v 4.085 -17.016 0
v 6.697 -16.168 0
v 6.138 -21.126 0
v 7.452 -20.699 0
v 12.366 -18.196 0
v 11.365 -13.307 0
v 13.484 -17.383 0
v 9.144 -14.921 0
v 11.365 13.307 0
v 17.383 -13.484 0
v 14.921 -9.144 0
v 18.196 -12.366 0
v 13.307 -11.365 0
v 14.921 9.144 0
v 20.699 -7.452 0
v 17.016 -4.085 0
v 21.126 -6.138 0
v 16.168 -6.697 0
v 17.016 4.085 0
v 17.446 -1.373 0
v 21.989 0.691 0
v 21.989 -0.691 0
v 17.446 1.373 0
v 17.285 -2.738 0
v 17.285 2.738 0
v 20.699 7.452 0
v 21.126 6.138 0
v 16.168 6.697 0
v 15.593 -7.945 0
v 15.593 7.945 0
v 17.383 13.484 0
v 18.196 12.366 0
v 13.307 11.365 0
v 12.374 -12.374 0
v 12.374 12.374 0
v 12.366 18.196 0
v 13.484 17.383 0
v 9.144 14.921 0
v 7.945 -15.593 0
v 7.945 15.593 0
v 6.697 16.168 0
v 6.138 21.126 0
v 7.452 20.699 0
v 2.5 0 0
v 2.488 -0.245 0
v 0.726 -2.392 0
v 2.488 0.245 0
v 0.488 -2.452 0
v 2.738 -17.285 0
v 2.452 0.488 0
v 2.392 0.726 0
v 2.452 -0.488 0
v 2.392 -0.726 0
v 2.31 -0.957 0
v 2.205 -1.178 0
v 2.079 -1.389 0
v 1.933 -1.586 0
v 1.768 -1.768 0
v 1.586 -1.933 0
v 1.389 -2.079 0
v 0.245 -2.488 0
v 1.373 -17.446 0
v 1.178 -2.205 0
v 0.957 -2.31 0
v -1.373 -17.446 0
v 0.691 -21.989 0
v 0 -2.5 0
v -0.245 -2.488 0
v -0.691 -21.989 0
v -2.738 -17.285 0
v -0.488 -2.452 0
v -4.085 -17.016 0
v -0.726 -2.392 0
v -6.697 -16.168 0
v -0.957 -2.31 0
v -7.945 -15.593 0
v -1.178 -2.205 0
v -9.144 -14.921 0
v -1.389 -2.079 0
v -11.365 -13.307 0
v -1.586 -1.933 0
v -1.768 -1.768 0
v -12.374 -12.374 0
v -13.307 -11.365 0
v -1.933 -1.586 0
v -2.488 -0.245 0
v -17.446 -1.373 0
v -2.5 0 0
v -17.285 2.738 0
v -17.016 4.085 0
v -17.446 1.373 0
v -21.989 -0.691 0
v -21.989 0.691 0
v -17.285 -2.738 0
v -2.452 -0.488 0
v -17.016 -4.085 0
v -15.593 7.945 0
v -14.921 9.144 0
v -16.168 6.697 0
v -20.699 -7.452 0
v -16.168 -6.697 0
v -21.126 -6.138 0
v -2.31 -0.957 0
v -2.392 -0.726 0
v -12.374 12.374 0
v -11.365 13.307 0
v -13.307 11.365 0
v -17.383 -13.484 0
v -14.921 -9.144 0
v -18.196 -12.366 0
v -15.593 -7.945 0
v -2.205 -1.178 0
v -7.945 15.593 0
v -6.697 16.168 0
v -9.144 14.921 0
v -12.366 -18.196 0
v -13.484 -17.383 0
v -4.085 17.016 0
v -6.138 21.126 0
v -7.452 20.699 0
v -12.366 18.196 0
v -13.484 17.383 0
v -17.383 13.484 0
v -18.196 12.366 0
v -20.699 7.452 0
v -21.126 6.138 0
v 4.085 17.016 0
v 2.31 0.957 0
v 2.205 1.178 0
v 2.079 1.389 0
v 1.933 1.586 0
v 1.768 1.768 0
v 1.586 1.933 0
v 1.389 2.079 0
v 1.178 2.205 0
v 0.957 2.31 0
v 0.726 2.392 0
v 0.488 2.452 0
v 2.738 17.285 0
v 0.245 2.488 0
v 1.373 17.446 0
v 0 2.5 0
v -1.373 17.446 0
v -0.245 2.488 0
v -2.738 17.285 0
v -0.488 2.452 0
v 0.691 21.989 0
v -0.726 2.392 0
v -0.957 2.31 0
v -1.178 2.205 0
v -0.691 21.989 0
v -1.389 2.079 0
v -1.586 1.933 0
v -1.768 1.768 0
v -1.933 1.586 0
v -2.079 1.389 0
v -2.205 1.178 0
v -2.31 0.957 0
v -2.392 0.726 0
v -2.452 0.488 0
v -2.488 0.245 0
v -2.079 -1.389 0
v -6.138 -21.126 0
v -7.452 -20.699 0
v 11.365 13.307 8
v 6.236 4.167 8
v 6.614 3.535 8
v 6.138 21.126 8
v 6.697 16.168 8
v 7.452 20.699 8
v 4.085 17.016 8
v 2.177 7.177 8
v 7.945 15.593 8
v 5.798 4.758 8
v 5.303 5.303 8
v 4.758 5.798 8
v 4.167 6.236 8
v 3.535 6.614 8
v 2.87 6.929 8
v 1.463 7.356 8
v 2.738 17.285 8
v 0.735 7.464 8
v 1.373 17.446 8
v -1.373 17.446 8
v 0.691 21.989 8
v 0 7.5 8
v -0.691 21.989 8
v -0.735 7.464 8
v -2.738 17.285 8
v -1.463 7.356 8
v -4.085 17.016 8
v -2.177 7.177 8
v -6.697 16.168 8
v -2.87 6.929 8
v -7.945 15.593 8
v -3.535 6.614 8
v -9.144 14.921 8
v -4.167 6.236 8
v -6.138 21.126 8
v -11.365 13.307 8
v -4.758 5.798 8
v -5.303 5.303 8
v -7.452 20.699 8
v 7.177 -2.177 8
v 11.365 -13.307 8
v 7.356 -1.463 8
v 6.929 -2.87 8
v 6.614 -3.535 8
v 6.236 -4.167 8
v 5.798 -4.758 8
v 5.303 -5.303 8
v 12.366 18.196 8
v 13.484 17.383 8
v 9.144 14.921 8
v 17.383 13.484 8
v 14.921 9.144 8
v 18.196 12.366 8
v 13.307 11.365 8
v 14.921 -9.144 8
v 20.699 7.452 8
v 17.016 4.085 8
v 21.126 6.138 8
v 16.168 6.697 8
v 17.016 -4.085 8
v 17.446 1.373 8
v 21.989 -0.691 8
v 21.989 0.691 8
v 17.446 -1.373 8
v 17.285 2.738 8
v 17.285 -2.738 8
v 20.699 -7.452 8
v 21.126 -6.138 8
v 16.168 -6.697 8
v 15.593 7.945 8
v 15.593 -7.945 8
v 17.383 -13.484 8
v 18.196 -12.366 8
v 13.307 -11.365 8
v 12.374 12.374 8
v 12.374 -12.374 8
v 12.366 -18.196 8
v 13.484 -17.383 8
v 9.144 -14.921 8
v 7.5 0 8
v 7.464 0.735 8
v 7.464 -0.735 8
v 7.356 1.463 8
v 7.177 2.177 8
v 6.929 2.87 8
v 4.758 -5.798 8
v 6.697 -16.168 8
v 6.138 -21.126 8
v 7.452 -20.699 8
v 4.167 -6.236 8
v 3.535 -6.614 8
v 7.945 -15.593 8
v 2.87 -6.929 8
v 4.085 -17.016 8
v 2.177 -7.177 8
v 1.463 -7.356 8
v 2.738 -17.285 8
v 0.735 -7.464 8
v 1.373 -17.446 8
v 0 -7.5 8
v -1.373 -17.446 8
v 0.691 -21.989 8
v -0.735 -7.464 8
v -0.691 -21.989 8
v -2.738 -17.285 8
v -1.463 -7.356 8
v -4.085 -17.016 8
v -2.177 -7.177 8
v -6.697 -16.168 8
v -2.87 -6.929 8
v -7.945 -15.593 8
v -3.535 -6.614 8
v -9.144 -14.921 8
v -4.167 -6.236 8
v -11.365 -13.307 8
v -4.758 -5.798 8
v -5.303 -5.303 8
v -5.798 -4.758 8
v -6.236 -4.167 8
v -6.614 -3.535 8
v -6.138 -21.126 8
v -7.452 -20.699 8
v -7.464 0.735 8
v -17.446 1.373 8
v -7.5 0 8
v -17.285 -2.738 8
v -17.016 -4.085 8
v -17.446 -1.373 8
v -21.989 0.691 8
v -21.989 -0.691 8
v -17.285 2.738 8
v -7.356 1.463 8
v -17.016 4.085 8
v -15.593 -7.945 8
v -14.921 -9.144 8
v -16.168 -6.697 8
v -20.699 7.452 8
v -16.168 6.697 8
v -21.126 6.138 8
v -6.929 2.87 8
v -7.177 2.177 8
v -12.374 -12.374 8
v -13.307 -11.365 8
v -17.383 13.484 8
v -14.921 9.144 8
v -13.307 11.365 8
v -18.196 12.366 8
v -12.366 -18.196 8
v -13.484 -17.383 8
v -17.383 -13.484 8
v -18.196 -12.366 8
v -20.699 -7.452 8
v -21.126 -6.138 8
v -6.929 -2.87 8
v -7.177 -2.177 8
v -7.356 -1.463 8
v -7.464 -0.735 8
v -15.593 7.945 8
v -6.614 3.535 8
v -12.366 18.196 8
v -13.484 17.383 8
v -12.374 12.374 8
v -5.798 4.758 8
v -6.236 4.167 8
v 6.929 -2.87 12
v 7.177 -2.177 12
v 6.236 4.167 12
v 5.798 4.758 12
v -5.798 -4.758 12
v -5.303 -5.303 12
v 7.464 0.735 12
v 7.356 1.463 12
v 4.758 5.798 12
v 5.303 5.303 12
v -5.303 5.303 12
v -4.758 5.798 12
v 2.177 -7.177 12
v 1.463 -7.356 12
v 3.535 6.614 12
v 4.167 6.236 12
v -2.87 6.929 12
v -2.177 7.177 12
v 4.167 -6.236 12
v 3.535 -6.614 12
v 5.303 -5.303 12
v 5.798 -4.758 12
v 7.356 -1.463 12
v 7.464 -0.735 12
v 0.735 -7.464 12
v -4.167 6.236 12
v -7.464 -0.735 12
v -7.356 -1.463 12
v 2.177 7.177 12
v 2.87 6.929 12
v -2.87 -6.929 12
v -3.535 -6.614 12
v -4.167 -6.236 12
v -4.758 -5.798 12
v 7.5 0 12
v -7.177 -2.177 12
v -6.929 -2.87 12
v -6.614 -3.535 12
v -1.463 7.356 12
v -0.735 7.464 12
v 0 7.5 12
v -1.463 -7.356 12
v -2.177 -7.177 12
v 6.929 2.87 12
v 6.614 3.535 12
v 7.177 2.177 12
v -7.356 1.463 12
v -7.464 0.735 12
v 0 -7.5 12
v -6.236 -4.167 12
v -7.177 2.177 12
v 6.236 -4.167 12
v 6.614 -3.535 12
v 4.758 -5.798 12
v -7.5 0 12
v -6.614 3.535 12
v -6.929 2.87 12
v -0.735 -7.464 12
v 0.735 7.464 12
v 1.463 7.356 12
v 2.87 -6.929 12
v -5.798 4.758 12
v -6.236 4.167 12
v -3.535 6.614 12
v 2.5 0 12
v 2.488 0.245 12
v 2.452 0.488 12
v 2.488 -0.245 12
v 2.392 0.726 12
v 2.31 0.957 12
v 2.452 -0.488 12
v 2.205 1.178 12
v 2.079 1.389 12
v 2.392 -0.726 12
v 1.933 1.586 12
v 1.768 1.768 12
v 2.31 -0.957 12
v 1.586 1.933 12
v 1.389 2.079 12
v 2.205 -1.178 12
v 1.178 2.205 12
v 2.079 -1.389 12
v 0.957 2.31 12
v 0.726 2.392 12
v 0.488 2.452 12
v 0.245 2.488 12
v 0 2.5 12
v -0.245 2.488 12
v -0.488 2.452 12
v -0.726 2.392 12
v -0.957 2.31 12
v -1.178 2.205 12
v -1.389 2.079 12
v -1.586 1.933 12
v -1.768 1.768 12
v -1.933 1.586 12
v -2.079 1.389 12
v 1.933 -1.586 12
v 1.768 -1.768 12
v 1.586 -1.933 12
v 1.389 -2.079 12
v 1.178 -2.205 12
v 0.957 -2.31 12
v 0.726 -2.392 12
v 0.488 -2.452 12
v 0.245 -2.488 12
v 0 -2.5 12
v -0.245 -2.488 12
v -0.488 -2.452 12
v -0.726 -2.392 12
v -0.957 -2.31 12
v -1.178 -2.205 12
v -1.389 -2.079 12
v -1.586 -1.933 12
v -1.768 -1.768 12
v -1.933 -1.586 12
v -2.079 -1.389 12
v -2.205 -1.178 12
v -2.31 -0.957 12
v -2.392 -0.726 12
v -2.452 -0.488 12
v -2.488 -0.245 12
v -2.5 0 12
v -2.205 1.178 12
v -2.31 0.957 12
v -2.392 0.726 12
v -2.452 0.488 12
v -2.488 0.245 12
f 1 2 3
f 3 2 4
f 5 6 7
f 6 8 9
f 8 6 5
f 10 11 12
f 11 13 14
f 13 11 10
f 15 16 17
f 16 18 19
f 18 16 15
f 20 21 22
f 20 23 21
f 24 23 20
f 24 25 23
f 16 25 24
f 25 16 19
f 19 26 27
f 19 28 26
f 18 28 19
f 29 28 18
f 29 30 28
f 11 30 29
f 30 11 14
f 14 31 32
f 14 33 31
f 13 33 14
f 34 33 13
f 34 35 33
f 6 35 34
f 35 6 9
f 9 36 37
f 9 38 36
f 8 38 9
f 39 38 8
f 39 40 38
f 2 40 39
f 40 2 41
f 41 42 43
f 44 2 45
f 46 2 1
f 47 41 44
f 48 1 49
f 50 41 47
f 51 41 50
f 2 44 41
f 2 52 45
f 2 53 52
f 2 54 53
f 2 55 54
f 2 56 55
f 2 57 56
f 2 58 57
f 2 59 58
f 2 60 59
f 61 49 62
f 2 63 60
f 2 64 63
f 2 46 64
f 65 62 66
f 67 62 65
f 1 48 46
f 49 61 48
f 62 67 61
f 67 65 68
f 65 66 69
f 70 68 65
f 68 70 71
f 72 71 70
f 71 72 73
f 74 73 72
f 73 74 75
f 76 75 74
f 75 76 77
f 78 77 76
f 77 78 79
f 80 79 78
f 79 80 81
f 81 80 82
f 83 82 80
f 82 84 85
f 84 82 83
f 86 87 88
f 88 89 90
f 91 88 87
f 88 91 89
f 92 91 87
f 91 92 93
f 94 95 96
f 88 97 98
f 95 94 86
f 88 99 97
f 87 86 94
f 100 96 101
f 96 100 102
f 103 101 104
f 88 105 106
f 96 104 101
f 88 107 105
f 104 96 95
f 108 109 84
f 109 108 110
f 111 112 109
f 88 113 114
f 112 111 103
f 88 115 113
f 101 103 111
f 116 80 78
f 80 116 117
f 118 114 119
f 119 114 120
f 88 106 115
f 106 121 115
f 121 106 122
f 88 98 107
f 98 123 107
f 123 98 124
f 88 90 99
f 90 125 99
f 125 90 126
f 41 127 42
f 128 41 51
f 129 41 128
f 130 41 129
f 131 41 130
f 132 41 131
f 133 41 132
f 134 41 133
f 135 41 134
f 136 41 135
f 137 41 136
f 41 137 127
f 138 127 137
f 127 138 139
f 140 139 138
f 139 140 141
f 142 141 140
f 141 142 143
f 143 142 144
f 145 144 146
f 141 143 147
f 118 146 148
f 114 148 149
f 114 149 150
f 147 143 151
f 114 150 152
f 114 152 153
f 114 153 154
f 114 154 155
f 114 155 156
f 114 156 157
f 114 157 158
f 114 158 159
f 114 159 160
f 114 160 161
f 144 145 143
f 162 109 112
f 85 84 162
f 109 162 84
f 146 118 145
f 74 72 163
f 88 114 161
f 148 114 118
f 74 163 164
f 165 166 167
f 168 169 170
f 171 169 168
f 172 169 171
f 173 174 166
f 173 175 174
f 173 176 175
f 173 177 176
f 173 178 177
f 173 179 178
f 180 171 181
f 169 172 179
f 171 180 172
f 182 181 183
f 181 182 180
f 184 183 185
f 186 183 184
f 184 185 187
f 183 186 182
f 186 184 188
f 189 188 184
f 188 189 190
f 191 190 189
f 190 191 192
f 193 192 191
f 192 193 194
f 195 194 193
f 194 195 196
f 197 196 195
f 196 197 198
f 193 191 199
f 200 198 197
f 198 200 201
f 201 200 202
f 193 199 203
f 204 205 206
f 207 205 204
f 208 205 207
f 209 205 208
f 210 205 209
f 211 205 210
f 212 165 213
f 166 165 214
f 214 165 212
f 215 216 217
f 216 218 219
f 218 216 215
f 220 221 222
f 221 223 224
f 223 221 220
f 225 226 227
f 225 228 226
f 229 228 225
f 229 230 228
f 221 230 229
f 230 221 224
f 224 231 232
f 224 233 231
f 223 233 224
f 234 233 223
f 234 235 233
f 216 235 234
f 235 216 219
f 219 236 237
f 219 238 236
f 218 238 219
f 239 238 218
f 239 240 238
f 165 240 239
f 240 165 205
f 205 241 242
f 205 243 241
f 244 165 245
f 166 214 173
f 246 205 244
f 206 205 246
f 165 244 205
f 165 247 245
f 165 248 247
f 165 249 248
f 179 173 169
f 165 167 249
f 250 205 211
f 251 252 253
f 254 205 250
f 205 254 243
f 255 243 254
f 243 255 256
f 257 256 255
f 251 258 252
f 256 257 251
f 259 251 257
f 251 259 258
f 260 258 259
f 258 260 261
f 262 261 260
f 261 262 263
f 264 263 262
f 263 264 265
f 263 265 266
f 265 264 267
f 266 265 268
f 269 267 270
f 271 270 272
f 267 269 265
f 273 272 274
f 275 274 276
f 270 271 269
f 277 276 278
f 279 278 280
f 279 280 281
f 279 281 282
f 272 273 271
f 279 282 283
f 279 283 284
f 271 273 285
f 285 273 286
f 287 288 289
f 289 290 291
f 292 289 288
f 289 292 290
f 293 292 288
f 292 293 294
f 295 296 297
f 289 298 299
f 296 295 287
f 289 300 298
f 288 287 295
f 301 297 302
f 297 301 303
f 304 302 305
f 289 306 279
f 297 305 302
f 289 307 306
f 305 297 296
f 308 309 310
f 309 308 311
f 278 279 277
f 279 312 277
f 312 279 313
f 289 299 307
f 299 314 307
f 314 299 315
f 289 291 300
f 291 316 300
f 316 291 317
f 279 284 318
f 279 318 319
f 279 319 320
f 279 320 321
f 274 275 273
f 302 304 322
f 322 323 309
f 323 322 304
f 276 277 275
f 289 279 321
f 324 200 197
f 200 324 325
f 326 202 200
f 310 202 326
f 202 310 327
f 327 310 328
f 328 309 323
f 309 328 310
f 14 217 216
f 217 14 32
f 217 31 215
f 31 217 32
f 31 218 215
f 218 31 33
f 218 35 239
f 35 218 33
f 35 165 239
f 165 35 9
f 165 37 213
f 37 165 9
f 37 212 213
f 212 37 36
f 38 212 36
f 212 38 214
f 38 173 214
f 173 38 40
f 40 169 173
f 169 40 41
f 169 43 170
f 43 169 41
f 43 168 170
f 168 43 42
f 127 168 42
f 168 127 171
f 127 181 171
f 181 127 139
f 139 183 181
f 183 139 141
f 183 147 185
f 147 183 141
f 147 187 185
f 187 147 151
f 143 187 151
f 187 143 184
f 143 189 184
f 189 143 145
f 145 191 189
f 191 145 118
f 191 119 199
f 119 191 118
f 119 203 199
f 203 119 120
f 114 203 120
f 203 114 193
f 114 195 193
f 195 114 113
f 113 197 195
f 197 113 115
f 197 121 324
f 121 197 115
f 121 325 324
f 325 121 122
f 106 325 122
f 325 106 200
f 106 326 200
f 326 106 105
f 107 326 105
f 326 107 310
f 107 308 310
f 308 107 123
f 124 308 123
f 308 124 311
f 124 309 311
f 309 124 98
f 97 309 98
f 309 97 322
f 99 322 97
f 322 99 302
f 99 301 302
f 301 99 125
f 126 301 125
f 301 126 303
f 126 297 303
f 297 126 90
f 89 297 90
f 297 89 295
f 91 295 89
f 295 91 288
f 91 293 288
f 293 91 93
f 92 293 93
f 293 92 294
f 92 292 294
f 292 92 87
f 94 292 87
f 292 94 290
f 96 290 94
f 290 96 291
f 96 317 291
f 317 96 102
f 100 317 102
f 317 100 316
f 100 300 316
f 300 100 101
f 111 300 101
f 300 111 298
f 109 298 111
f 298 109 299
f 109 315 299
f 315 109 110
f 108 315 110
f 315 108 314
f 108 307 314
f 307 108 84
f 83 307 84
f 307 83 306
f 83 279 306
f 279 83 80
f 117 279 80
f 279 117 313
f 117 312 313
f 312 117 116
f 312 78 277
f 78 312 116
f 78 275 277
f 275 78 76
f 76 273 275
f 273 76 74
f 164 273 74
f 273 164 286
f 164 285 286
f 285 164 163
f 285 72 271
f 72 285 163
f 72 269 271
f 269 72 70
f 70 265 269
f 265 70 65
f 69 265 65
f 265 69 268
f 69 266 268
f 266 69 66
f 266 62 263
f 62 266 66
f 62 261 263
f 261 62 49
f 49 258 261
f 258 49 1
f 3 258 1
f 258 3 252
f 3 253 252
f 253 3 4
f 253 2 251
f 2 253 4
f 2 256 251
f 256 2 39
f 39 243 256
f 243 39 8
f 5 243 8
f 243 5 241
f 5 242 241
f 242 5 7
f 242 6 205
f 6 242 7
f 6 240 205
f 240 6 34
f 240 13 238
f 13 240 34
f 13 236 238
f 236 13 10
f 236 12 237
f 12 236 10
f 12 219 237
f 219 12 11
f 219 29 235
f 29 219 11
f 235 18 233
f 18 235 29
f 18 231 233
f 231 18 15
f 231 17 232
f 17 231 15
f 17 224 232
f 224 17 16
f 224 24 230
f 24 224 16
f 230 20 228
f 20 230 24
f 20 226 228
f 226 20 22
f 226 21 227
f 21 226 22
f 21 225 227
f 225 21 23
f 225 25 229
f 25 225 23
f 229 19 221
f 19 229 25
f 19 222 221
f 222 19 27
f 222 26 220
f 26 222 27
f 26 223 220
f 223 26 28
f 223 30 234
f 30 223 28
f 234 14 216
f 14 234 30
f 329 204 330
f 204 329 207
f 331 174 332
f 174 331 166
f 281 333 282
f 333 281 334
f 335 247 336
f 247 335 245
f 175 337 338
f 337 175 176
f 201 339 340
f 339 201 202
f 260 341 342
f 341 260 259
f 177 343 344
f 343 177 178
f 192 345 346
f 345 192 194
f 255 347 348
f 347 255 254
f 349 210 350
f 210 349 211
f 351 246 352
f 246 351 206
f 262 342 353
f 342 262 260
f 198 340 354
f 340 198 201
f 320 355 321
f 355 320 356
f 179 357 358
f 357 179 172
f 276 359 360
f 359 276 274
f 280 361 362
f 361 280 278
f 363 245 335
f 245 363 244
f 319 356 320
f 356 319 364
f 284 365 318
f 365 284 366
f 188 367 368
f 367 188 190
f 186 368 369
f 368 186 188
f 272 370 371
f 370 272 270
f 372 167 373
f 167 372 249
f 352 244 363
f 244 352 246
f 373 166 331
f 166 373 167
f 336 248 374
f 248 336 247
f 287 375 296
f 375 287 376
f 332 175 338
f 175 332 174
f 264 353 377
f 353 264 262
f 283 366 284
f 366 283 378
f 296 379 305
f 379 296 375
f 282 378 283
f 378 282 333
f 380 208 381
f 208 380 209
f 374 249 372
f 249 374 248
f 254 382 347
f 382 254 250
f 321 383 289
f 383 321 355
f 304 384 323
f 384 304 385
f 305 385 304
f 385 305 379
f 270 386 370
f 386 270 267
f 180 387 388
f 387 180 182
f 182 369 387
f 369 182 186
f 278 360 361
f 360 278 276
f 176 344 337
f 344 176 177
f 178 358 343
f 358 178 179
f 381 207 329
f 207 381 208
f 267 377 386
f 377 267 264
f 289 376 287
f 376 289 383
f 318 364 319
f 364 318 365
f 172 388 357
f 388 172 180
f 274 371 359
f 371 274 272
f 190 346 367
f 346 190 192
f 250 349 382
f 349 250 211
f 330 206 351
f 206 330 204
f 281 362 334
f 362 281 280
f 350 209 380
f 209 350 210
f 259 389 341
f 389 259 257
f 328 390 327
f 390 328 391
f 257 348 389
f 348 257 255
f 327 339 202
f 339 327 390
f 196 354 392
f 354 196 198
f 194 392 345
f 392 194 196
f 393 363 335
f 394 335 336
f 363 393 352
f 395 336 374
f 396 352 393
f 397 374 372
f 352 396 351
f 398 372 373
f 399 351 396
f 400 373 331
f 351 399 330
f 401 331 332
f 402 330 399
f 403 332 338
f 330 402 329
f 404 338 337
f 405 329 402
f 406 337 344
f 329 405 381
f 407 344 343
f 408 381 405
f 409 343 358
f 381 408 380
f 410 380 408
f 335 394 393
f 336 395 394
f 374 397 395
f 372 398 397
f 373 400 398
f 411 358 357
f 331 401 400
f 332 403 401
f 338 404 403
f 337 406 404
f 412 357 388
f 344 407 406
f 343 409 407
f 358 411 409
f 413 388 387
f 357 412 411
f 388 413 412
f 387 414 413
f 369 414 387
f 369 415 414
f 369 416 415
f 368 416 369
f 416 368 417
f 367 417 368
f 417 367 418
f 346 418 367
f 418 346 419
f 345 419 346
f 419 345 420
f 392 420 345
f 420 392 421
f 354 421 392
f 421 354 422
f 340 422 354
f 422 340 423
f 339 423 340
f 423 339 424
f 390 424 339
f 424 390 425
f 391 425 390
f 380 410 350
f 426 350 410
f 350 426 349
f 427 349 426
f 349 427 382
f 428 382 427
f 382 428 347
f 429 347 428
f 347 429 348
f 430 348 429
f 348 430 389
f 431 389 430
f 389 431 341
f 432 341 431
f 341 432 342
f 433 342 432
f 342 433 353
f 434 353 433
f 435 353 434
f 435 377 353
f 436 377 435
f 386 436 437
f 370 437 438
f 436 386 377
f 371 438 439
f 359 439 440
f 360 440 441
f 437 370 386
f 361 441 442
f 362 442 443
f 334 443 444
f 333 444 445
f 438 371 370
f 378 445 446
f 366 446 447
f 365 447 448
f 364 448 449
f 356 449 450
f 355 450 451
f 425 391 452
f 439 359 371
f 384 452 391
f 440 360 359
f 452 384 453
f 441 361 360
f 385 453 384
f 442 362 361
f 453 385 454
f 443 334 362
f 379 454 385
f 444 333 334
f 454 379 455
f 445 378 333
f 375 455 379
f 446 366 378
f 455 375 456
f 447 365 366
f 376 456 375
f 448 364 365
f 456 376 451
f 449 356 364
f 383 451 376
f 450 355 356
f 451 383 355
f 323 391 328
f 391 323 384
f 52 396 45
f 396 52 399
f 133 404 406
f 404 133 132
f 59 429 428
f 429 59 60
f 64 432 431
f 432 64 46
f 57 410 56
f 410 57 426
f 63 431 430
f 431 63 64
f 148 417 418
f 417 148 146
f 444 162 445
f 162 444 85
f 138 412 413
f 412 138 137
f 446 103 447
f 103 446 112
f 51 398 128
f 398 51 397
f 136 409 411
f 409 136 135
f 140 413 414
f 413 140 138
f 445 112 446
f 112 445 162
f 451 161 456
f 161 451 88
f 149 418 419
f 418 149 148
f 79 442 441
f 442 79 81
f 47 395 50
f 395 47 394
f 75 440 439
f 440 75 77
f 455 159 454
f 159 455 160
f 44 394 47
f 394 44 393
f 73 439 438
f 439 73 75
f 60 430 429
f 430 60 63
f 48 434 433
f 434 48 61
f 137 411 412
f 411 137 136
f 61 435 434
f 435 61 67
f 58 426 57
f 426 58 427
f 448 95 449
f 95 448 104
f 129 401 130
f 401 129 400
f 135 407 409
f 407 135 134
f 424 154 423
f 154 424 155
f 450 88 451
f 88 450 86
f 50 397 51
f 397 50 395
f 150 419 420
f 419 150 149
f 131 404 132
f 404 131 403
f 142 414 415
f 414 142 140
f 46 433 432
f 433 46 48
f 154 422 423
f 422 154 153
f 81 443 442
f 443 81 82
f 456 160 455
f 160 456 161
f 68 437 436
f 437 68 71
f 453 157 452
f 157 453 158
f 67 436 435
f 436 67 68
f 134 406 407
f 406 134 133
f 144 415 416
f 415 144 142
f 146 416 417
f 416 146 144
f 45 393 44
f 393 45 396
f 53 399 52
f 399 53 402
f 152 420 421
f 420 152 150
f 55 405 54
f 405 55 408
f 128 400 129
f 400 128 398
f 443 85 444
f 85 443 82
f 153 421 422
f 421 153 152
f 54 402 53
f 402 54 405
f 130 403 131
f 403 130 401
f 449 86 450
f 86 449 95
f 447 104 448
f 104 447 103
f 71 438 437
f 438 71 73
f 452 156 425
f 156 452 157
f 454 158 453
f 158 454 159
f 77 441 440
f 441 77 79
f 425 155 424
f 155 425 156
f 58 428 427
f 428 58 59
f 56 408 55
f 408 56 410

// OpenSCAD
// file: ../lib/validate-project.scad
// validate-project.scad — Project-specific validators (project-owned, never overwritten by harness)
// Base validators live in validate.scad (refreshable via harness init --openscad --refresh)
//
// Add project-specific validators here. Examples:
//   validate_wire_channel(diameter)    — for cable routing parts
//   validate_bore_fit(inner, outer)    — for press-fit assemblies
//   validate_build_plate(x, y, z)     — for printer-specific size limits
//
// Call-site parameterization for material overrides:
//   Base validators already accept parameters with defaults. Override at the call site:
//     validate_wall_thickness("wall", wall, min_wall=1.2);  // PETG override
//     validate_wall_thickness("wall", wall);                  // default 0.8 (PLA)
//   No wrapper modules or config files needed.

use <validate.scad>

// --- Project-specific validators below ---
// Add your project's custom validators here.
// They can call base validators internally if needed.

// Example: Validate part fits on build plate
// module validate_build_plate(name, x, y, z, max_x=220, max_y=220, max_z=250) {
//     assert(x <= max_x, str("GATE FAIL: ", name, " x=", x, "mm > ", max_x, "mm build plate width"));
//     assert(y <= max_y, str("GATE FAIL: ", name, " y=", y, "mm > ", max_y, "mm build plate depth"));
//     assert(z <= max_z, str("GATE FAIL: ", name, " z=", z, "mm > ", max_z, "mm build plate height"));
// }
// file: ../lib/validate.scad
// validate.scad — BASE Layer 1 parameter validation library (refreshable)
// Refreshable via: harness init --openscad --refresh
// DO NOT add project-specific validators here — use validate-project.scad instead.
//
// Pattern: assert() gates with GATE FAIL: prefix for grep-able error extraction
// Usage: use <../lib/validate.scad> then call validate_* modules

// Validate a numeric parameter is within bounds
// Fails with GATE FAIL: prefix and interpolated values
module validate_range(name, value, min_val, max_val) {
    assert(value >= min_val,
        str("GATE FAIL: ", name, "=", value, " < ", min_val, " minimum"));
    assert(value <= max_val,
        str("GATE FAIL: ", name, "=", value, " > ", max_val, " maximum"));
}

// Validate a dimension is positive
module validate_positive(name, value) {
    assert(value > 0,
        str("GATE FAIL: ", name, "=", value, " must be positive"));
}

// Validate wall thickness meets printability minimum
module validate_wall_thickness(name, value, min_wall=0.8) {
    assert(value >= min_wall,
        str("GATE FAIL: ", name, "=", value, "mm < ", min_wall, "mm minimum wall thickness"));
}

// Validate $fn is reasonable for printable curves
module validate_fn(fn_val, min_fn=16, max_fn=256) {
    assert(fn_val >= min_fn,
        str("GATE FAIL: $fn=", fn_val, " < ", min_fn, " (too coarse for printable curves)"));
    assert(fn_val <= max_fn,
        str("GATE FAIL: $fn=", fn_val, " > ", max_fn, " (excessive polygon count)"));
}

// Validate hole diameter is printable
module validate_hole(name, diameter, min_diameter=1.0) {
    assert(diameter >= min_diameter,
        str("GATE FAIL: ", name, "=", diameter, "mm < ", min_diameter, "mm minimum hole diameter"));
}

// Validate that interior space exists (wall doesn't consume entire dimension)
module validate_interior(dim_name, dim_value, wall_name, wall_value) {
    assert(wall_value < dim_value / 2,
        str("GATE FAIL: ", wall_name, "=", wall_value,
            " >= ", dim_name, "/2=", dim_value/2, " (no interior space)"));
}

// Batch validate common bracket/enclosure parameters
// This is the recommended entry point for simple parts
module validate_part(width, height, depth, wall_thickness,
                     fn=32, holes=[], min_wall=0.8) {
    validate_positive("width", width);
    validate_positive("height", height);
    validate_positive("depth", depth);
    validate_wall_thickness("wall_thickness", wall_thickness, min_wall);
    validate_fn(fn);
    validate_interior("width", width, "wall_thickness", wall_thickness);
    validate_interior("depth", depth, "wall_thickness", wall_thickness);

    // Validate each hole diameter if provided
    for (i = [0:len(holes)-1]) {
        validate_hole(str("hole[", i, "]"), holes[i]);
    }
}
// main file
// gear.scad — Parametric involute spur gear
// Demonstrates: trigonometric geometry, module-pitch system, hub/bore

// --- Parameters (override via -D flags) ---
teeth = 20;             // number of teeth
module_pitch = 2;       // mm — gear module (tooth size)
pressure_angle = 20;    // degrees — standard: 14.5 or 20
gear_thickness = 8;     // mm — face width
hub_diameter = 15;      // mm — central hub
hub_height = 4;         // mm — hub protrusion
bore_diameter = 5;      // mm — shaft bore
fn = 64;                // facet count (gears need higher resolution)

// --- Layer 1: Parameter Validation ---
use <../lib/validate.scad>
use <../lib/validate-project.scad>

validate_positive("teeth", teeth);
validate_positive("module_pitch", module_pitch);
validate_positive("gear_thickness", gear_thickness);
validate_positive("hub_diameter", hub_diameter);
validate_positive("bore_diameter", bore_diameter);
validate_fn(fn);

// Gear-specific validations
assert(teeth >= 6,
    str("GATE FAIL: teeth=", teeth, " < 6 minimum (undercut occurs below ~12 teeth)"));
assert(module_pitch >= 0.5,
    str("GATE FAIL: module_pitch=", module_pitch, " < 0.5mm minimum"));
assert(module_pitch <= 10,
    str("GATE FAIL: module_pitch=", module_pitch, " > 10mm maximum"));
assert(pressure_angle >= 14 && pressure_angle <= 25,
    str("GATE FAIL: pressure_angle=", pressure_angle, " outside 14-25° range"));
assert(bore_diameter < hub_diameter,
    str("GATE FAIL: bore_diameter=", bore_diameter, " >= hub_diameter=", hub_diameter));

// Derived dimensions
pitch_radius = (teeth * module_pitch) / 2;
addendum = module_pitch;
dedendum = 1.25 * module_pitch;
outer_radius = pitch_radius + addendum;
root_radius = pitch_radius - dedendum;
base_radius = pitch_radius * cos(pressure_angle);

assert(root_radius > bore_diameter / 2 + 1,
    str("GATE FAIL: root_radius=", root_radius,
        "mm too close to bore_diameter/2=", bore_diameter / 2,
        "mm (need >1mm wall)"));

// Advisory
if (teeth < 12)
    echo("WARN: teeth=", teeth, " — significant undercut expected below 12 teeth");
if (fn < 64)
    echo("WARN: $fn=", fn, " — gear tooth profiles benefit from $fn >= 64");

// --- Geometry ---

// Involute curve point at parameter t (radians from base circle)
function involute_point(base_r, t) =
    [base_r * (cos(t * 180 / PI) + t * sin(t * 180 / PI)),
     base_r * (sin(t * 180 / PI) - t * cos(t * 180 / PI))];

// Generate involute curve points
function involute_curve(base_r, steps, max_r) =
    let(max_t = sqrt((max_r / base_r) * (max_r / base_r) - 1))
    [for (i = [0:steps])
        let(t = max_t * i / steps)
        involute_point(base_r, t)];

// Single tooth profile as 2D polygon
module tooth_profile() {
    // Approximate tooth with trapezoid + tip arc for printability
    tooth_angle = 360 / teeth;
    tip_width = module_pitch * 0.3;
    root_width = module_pitch * 0.5;

    // Simplified tooth profile (polygon approximation)
    half_angle = tooth_angle / 4;
    points = [
        [root_radius * cos(-half_angle), root_radius * sin(-half_angle)],
        [outer_radius * cos(-half_angle * 0.4), outer_radius * sin(-half_angle * 0.4)],
        [outer_radius * cos(half_angle * 0.4), outer_radius * sin(half_angle * 0.4)],
        [root_radius * cos(half_angle), root_radius * sin(half_angle)]
    ];
    polygon(points);
}

module gear_body() {
    difference() {
        union() {
            // Gear disc with teeth
            linear_extrude(height=gear_thickness) {
                // Root circle
                circle(r=root_radius, $fn=teeth * 4);

                // Teeth
                for (i = [0:teeth - 1]) {
                    rotate([0, 0, i * 360 / teeth])
                        tooth_profile();
                }
            }

            // Hub
            if (hub_height > 0) {
                translate([0, 0, gear_thickness])
                    cylinder(d=hub_diameter, h=hub_height, $fn=fn);
            }
        }

        // Bore hole (through entire part)
        translate([0, 0, -1])
            cylinder(d=bore_diameter, h=gear_thickness + hub_height + 2, $fn=fn);
    }
}

gear_body();
